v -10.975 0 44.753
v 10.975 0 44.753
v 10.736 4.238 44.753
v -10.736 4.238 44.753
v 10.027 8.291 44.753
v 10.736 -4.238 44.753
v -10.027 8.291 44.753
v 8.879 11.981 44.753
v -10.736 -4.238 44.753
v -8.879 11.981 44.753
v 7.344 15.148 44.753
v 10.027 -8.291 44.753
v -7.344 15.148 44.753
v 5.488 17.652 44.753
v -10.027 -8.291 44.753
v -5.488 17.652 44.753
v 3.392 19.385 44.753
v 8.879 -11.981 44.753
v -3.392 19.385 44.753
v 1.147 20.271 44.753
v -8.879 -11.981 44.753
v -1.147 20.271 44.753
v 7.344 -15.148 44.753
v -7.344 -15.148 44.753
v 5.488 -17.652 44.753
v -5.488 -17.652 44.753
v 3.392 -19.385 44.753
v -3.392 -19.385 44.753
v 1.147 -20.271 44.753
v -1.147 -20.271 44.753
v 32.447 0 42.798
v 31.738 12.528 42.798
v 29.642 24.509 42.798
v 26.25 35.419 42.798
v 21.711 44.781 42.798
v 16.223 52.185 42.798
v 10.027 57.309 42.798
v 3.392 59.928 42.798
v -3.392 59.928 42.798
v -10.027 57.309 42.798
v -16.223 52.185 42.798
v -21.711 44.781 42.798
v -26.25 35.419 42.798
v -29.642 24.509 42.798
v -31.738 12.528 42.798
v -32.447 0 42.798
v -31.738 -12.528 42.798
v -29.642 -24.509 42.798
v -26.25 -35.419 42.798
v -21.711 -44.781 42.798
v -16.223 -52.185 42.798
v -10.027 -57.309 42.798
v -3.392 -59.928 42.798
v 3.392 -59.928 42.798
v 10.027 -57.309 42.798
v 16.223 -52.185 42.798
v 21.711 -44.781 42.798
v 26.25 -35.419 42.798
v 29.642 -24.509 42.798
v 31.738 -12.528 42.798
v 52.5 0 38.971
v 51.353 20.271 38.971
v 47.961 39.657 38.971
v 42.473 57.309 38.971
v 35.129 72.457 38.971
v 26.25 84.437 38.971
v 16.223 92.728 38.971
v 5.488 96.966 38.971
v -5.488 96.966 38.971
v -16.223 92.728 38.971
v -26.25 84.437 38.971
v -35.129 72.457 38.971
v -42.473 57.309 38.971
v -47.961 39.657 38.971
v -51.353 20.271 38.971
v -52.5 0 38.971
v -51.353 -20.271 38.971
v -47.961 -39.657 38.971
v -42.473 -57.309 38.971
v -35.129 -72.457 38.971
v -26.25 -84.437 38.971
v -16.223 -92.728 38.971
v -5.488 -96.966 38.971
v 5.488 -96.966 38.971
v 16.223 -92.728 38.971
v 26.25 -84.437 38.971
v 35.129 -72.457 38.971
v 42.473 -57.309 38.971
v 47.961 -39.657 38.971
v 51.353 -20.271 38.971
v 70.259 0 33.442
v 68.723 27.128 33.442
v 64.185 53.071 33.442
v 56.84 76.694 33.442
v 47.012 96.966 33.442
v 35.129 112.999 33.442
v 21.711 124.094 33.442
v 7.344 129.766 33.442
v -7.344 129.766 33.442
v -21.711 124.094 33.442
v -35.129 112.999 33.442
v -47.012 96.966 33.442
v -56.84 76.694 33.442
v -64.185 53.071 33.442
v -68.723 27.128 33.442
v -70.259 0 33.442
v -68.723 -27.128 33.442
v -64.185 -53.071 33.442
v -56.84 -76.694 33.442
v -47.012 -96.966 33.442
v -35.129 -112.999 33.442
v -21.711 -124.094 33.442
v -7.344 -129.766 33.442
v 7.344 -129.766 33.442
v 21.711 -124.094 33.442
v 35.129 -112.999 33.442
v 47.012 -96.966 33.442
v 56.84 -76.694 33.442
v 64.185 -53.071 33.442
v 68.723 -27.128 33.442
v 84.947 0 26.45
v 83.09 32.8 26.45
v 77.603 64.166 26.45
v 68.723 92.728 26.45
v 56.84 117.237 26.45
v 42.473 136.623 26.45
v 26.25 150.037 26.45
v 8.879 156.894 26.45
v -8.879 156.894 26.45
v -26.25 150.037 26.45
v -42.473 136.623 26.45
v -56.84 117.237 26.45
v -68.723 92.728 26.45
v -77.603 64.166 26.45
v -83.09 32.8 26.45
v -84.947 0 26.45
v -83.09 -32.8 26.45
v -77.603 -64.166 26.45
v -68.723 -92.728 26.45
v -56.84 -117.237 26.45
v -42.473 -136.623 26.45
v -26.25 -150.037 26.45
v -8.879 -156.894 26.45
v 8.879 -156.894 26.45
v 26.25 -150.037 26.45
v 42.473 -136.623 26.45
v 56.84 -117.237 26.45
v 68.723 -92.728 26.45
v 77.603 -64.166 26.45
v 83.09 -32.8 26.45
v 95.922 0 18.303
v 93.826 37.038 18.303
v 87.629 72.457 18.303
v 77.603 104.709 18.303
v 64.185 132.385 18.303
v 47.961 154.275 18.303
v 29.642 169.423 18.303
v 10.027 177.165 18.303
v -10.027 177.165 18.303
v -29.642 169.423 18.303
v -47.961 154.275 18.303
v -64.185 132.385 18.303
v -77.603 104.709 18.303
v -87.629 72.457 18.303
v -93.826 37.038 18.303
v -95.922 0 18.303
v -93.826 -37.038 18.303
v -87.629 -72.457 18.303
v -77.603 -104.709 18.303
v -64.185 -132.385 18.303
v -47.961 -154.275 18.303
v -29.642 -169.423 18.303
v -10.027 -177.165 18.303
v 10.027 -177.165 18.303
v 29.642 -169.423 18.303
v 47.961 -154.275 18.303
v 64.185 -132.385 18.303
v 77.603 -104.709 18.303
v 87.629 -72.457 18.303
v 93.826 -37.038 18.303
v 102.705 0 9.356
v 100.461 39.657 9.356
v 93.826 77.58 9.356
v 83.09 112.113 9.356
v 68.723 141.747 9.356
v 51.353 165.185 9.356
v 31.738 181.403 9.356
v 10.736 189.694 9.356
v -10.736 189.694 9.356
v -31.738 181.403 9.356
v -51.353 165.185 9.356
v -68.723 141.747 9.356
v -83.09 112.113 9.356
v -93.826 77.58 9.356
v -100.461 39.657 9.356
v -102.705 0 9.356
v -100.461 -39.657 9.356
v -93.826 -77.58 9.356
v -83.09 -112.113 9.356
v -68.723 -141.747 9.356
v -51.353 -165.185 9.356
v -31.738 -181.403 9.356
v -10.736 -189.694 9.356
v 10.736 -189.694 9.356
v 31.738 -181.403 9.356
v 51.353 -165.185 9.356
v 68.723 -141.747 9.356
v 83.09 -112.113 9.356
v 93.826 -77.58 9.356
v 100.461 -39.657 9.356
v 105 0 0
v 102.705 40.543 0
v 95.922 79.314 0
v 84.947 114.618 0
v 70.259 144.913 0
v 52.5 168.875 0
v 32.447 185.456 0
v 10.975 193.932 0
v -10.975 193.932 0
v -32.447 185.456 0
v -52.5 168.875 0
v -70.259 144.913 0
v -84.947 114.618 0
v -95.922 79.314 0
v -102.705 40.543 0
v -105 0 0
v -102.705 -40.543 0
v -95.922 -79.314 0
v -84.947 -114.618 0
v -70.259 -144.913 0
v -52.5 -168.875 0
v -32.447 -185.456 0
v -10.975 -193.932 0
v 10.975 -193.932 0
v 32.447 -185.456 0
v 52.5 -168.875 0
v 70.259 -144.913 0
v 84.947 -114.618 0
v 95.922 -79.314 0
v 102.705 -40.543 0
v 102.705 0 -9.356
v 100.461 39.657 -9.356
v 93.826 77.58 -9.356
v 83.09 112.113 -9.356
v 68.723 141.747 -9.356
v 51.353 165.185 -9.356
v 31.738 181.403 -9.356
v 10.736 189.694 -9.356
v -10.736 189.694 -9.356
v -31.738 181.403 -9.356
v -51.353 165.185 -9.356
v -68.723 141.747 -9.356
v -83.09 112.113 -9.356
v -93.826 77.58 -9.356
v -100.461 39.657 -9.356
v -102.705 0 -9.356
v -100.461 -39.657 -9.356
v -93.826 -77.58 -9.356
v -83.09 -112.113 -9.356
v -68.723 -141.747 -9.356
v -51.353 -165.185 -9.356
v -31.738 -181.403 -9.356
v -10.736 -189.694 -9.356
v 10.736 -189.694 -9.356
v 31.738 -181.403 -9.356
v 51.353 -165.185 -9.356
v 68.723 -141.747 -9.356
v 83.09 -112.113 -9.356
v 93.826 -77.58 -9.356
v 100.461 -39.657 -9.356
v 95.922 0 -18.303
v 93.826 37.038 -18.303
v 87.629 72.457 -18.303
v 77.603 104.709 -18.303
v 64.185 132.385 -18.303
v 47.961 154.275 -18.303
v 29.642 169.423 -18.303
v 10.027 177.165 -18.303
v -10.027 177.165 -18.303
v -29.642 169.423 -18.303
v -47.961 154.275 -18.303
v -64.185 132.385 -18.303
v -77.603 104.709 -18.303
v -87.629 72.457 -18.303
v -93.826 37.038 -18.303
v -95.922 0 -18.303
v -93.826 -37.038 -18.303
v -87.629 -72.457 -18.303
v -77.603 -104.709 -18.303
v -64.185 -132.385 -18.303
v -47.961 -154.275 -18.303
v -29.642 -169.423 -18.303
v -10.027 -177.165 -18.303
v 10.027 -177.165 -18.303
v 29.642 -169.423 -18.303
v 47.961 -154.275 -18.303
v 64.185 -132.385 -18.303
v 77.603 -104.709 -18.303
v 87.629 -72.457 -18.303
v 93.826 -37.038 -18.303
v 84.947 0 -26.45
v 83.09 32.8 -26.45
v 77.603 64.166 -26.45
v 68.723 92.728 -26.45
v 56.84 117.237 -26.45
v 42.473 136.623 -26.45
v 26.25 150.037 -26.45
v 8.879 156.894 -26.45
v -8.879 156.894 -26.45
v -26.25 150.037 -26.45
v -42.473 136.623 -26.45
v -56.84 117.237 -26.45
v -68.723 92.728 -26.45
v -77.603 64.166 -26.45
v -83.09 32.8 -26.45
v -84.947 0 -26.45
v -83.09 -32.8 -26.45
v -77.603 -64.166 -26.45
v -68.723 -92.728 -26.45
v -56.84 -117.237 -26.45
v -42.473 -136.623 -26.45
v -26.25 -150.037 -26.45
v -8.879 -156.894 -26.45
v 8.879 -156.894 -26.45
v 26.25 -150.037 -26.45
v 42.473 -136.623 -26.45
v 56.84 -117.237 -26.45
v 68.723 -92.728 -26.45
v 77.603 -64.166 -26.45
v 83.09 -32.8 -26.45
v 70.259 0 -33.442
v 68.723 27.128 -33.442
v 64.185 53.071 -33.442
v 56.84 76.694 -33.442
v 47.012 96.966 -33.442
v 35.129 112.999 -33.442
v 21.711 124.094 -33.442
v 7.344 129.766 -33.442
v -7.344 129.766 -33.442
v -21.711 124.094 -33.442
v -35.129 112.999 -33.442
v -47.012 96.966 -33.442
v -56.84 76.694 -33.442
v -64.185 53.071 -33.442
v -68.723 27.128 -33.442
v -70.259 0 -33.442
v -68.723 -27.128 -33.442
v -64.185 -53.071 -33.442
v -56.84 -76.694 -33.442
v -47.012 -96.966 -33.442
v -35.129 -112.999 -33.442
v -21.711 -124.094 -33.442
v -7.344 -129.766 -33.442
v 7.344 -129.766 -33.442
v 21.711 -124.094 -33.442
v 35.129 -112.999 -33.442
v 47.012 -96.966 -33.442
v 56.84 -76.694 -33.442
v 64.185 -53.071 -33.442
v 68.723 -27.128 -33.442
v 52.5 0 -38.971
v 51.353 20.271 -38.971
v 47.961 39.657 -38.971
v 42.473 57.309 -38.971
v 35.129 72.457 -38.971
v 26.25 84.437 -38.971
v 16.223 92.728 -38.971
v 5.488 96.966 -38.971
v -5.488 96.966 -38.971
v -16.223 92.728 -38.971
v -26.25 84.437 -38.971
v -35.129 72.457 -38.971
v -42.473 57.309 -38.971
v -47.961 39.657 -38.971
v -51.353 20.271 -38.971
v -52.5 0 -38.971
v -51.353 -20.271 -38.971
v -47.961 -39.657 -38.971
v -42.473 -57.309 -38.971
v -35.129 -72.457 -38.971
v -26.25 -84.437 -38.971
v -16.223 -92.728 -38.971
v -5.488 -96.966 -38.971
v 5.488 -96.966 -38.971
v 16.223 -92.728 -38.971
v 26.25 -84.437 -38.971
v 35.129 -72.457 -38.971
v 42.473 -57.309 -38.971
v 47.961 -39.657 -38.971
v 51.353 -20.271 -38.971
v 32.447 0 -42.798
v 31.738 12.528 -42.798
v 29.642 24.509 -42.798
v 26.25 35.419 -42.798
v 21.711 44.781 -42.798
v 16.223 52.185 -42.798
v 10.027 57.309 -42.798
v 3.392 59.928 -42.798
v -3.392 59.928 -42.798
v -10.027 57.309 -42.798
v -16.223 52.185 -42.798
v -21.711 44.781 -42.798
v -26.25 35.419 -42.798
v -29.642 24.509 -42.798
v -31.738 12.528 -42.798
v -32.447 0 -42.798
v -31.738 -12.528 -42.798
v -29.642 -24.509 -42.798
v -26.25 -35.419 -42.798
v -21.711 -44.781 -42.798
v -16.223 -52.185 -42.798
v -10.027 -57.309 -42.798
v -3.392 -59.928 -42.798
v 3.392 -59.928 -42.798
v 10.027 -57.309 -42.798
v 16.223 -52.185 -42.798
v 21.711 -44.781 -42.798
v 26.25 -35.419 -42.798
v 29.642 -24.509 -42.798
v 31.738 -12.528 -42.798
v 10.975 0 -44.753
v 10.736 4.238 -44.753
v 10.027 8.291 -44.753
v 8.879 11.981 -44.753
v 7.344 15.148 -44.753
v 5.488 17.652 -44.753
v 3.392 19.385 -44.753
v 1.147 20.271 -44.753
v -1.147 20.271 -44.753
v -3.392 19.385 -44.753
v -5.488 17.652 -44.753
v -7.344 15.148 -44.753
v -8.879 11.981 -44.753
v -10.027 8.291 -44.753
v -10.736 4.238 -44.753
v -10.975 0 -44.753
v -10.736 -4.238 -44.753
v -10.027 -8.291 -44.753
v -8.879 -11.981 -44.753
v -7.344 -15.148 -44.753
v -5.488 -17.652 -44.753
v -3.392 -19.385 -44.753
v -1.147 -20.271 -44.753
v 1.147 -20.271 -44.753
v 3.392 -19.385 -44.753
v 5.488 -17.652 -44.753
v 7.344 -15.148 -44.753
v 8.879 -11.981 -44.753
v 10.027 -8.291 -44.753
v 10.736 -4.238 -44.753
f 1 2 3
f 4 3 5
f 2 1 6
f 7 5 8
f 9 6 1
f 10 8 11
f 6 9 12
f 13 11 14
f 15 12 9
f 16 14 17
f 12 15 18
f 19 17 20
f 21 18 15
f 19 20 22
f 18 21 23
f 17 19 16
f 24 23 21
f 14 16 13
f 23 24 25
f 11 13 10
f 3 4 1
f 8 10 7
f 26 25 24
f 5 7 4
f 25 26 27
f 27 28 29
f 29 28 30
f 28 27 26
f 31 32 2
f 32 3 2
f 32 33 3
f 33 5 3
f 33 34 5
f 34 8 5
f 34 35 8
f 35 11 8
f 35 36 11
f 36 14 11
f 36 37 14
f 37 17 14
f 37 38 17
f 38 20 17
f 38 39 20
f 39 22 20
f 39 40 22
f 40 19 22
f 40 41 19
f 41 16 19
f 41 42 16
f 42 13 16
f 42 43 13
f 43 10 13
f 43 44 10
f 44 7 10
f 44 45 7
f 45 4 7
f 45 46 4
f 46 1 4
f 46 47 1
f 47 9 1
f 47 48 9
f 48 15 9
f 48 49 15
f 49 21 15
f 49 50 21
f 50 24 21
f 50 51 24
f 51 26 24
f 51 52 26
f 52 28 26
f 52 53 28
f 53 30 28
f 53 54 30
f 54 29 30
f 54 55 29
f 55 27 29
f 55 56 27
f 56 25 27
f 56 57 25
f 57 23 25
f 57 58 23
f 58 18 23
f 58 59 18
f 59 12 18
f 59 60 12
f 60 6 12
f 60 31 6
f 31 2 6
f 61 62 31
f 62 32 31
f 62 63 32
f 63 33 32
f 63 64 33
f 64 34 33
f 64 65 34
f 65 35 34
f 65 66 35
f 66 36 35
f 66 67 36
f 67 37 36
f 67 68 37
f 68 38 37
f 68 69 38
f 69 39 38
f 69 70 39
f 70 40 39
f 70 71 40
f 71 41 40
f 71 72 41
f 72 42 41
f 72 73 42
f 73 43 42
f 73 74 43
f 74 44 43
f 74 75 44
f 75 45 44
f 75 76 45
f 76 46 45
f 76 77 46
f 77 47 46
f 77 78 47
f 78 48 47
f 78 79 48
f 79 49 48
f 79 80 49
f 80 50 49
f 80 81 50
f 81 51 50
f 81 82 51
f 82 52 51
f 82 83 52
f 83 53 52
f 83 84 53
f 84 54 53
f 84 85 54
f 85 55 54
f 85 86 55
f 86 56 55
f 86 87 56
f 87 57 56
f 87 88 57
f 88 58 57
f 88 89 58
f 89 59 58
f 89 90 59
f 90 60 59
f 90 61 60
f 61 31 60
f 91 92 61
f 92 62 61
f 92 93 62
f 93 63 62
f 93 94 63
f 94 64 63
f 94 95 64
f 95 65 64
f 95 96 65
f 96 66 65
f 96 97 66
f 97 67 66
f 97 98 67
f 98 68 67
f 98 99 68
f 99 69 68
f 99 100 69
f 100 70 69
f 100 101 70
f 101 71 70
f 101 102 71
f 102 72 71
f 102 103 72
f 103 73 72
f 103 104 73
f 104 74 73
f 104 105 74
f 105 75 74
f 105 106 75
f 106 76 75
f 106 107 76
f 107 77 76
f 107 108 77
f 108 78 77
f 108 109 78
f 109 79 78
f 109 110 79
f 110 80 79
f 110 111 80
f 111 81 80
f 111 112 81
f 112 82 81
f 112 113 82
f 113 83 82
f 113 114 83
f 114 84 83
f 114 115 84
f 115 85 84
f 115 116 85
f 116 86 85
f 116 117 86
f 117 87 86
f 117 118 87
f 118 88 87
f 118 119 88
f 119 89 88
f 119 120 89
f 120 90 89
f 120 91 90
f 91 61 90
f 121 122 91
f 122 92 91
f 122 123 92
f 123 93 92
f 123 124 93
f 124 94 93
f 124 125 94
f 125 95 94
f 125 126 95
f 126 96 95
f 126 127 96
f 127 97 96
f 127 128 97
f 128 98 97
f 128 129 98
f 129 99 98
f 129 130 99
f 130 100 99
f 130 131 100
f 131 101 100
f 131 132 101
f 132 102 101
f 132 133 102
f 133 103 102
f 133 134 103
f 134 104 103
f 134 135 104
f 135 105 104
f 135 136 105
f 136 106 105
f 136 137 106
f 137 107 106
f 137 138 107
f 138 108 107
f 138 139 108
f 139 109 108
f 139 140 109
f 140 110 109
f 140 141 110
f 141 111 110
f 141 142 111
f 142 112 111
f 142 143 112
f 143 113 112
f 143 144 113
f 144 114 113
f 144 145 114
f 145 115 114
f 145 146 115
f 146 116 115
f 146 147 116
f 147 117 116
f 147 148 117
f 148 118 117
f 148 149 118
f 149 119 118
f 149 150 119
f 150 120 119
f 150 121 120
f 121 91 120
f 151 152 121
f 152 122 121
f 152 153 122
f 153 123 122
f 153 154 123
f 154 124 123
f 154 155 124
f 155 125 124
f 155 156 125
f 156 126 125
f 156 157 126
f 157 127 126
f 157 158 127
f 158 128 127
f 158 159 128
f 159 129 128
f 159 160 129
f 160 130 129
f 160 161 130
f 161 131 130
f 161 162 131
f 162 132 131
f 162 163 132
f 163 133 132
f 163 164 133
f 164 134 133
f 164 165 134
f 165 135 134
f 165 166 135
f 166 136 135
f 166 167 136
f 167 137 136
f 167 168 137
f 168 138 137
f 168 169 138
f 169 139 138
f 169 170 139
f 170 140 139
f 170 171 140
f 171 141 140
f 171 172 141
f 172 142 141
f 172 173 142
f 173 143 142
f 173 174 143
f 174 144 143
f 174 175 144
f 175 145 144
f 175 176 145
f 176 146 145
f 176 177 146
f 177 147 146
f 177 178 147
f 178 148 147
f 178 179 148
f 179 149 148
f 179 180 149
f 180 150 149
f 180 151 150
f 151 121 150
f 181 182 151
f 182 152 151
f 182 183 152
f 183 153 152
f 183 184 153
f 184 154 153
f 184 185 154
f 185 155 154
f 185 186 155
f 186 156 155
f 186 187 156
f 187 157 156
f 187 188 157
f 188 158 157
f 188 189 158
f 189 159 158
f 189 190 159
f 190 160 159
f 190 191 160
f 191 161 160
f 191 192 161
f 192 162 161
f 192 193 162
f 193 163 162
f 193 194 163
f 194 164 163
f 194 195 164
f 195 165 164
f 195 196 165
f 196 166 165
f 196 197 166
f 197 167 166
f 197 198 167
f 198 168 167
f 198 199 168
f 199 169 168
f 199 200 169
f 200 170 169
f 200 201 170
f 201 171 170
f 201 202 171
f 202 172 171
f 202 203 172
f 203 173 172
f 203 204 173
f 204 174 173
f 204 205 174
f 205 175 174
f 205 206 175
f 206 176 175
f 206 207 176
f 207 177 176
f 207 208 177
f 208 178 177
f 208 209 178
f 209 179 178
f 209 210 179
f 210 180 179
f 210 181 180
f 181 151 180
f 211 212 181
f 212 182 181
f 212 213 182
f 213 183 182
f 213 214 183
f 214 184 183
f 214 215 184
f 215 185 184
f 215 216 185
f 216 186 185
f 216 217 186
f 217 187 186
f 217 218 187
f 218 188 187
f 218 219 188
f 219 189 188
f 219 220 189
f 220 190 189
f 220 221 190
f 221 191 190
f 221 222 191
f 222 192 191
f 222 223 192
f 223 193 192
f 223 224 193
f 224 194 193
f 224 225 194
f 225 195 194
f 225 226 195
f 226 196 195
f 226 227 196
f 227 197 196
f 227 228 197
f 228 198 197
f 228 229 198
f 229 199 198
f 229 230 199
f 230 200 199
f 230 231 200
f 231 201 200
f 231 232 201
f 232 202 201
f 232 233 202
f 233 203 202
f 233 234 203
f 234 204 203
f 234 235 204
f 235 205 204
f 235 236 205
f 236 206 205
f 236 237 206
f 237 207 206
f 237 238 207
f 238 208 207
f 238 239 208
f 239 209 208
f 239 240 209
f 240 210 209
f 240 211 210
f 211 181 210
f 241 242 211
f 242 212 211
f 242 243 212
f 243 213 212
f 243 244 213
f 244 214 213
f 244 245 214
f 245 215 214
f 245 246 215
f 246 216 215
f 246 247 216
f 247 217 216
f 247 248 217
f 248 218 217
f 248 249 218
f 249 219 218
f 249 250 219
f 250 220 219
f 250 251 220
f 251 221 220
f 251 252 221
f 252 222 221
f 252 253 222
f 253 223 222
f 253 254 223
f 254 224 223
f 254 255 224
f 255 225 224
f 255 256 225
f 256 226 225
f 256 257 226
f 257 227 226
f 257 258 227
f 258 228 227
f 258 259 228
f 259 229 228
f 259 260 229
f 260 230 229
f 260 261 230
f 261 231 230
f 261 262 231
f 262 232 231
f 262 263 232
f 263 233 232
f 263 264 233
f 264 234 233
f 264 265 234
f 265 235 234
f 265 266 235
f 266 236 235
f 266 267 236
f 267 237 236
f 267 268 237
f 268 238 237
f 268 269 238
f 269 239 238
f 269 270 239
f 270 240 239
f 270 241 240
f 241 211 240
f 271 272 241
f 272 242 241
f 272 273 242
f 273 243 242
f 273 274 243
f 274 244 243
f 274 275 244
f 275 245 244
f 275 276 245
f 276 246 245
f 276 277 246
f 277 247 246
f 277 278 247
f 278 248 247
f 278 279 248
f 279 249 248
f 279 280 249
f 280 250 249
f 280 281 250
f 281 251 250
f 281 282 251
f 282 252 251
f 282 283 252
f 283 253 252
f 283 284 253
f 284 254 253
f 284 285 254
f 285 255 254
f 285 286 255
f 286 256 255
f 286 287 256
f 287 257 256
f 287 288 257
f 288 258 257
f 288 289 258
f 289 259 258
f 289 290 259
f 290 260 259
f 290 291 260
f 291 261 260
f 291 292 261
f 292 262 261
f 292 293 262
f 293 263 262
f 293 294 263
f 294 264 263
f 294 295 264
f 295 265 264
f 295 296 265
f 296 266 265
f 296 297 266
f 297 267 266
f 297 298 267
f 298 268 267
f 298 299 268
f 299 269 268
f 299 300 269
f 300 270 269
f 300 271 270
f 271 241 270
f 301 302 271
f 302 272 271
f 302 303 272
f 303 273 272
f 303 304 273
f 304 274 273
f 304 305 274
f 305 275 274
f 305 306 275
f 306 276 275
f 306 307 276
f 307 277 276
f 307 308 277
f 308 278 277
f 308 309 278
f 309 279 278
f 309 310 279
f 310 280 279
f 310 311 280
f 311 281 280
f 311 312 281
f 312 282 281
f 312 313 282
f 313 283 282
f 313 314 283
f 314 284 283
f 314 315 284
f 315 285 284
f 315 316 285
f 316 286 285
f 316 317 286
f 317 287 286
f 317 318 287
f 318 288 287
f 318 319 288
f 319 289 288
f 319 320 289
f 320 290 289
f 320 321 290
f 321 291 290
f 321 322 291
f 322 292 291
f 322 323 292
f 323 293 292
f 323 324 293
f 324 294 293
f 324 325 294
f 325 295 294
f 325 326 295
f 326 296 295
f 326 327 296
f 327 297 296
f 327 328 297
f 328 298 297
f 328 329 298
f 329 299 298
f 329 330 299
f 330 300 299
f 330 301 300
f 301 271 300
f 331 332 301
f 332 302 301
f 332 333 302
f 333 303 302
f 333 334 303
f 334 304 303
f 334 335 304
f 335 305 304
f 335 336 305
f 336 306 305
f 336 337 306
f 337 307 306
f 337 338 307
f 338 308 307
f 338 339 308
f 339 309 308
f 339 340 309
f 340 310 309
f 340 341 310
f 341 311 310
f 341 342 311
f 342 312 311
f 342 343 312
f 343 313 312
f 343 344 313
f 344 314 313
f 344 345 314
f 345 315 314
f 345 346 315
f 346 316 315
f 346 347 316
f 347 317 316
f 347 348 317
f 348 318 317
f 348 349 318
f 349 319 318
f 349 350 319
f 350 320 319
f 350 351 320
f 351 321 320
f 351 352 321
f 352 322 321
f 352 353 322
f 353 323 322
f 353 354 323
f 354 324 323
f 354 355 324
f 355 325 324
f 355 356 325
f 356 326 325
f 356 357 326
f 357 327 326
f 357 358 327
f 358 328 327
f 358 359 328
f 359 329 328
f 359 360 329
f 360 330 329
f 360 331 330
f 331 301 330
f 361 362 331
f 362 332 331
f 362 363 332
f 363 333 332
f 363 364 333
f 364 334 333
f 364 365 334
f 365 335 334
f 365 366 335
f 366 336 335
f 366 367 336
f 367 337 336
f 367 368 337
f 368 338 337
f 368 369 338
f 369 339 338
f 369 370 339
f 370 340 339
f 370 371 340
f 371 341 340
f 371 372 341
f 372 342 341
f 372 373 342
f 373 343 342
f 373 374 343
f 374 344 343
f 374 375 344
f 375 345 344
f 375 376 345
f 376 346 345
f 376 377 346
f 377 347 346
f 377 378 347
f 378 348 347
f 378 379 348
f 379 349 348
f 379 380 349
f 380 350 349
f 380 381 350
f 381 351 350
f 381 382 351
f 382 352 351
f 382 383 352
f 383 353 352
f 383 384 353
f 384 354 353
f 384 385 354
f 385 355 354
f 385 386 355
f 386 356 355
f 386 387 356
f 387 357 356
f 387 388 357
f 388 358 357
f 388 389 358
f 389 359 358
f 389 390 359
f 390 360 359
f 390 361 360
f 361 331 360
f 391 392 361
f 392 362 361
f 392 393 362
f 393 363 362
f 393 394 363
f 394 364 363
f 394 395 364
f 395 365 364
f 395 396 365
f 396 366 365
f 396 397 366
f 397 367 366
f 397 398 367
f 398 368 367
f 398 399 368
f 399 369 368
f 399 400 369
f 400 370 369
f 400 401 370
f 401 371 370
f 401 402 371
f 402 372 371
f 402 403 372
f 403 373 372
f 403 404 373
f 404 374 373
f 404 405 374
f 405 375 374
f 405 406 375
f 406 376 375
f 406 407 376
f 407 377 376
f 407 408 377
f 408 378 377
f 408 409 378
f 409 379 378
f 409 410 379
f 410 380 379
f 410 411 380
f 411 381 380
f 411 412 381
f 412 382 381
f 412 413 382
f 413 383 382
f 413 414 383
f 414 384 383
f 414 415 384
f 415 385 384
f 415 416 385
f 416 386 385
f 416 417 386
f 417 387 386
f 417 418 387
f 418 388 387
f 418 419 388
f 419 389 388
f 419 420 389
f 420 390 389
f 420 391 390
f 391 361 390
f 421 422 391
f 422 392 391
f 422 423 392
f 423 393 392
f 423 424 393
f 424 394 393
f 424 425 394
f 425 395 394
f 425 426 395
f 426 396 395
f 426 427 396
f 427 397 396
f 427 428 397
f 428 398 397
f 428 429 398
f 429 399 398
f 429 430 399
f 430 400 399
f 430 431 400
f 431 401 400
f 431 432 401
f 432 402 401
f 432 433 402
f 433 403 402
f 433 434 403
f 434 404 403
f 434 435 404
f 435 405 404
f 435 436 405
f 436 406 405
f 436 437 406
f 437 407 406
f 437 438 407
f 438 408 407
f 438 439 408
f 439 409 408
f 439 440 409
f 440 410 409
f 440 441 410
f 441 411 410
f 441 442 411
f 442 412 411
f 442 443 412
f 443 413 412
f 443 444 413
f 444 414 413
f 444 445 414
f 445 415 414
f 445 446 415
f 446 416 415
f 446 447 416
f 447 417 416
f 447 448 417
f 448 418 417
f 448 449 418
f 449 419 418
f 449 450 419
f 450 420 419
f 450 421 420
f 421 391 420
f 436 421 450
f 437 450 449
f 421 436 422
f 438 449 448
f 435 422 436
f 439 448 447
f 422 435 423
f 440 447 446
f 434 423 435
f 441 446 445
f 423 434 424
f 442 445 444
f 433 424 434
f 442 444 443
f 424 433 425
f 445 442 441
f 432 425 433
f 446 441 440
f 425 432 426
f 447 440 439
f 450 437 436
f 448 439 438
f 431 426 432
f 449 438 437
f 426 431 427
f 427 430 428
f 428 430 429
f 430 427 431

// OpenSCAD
// Generated by SolidPython 1.0.1 on 2020-07-29 00:46:47


scale(v = [7, 13, 3]) {
	sphere(r = 15);
}
/***********************************************
*********      SolidPython code:      **********
************************************************
 
# import packages: SolidPython
from solid import *
from solid.utils import *
from itertools import chain, combinations, permutations


class Resize:

    def __init__(self, scad_file):
        self.scad_file = scad_file
        #self.scad_file = import_scad(scad_file)
        # cone/cylinder param:
        self.r1 = 0
        self.r2 = 0
        self.h = 0
        # rectangular prism param:
        self.w = 0
        self.l = 0
        # ellipse param:
        self.r = 0

    # import OpenScad code (file name corresponds to shape)


    # classify shape + parameters
    def assign(self, param1, param2, param3):
        if self.scad_file == 'cone.scad':
            self.r1 = param1
            self.r2 = param2
            self.h = param3
        elif self.scad_file == 'cylinder.scad':
            self.r1 = param1
            self.r2 = param2
            self.h = param3
        elif self.scad_file == 'rectangularPrism.scad':
            self.h = param1
            self.l = param2
            self.w = param3
        else:
            self.r = param1
            self.h = param2

    # resize parameters
    def iterate(self):
        x = range(3, 20, 2)
        i = 1
        if self.scad_file == 'cone.scad':
            tempList = list(permutations(x, 2))
            for temp in tempList:
                param1 = temp[0]
                param2 = temp[1]
                filepath = 'produced_scad_files/' + 'cone' + str(param1) + '_' + str(param2) + '_' + '.scad'
                scad_render_to_file(cylinder(h=param1, r1=param2, r2=0), filepath)

        elif self.scad_file == 'cylinder.scad':
            tempList = list(permutations(x, 3))
            for temp in tempList:
                param1 = temp[0]
                param2 = temp[1]
                filepath = 'produced_scad_files/' + 'cylinder' + str(param1) + '_' + str(param2) + '_' + '.scad'
                scad_render_to_file(cylinder(h=param1, r1=param2, r2=param2), filepath)

        elif self.scad_file == 'rectangularPrism.scad':
            tempList = list(permutations(x, 3))
            for temp in tempList:
                param1 = temp[0]
                param2 = temp[1]
                param3 = temp[2]
                filepath = 'produced_scad_files/' + 'rectangularPrism' + str(param1) + '_' + str(param2) + '_' + str(
                    param3) + '.scad'
                scad_render_to_file(cube(size=(param1, param2, param3)), filepath)

        elif self.scad_file == 'ellipse.scad':
            tempList = list(permutations(x, 4))
            for temp in tempList:
                param1 = temp[0]
                param2 = temp[1]
                param3 = temp[2]
                param4 = temp[3]
                filepath = 'produced_scad_files/' + 'ellipse' + str(param1) + '_' + str(param2) + '_' + str(param3) + '_' + str(param4) + '.scad'
                scad_render_to_file(scale([param1, param2, param3])(sphere(r=param4)), filepath)

    def render_to_scadfile(self):
        scad_render_to_file(scad, 'example.scad') 
 
************************************************/
